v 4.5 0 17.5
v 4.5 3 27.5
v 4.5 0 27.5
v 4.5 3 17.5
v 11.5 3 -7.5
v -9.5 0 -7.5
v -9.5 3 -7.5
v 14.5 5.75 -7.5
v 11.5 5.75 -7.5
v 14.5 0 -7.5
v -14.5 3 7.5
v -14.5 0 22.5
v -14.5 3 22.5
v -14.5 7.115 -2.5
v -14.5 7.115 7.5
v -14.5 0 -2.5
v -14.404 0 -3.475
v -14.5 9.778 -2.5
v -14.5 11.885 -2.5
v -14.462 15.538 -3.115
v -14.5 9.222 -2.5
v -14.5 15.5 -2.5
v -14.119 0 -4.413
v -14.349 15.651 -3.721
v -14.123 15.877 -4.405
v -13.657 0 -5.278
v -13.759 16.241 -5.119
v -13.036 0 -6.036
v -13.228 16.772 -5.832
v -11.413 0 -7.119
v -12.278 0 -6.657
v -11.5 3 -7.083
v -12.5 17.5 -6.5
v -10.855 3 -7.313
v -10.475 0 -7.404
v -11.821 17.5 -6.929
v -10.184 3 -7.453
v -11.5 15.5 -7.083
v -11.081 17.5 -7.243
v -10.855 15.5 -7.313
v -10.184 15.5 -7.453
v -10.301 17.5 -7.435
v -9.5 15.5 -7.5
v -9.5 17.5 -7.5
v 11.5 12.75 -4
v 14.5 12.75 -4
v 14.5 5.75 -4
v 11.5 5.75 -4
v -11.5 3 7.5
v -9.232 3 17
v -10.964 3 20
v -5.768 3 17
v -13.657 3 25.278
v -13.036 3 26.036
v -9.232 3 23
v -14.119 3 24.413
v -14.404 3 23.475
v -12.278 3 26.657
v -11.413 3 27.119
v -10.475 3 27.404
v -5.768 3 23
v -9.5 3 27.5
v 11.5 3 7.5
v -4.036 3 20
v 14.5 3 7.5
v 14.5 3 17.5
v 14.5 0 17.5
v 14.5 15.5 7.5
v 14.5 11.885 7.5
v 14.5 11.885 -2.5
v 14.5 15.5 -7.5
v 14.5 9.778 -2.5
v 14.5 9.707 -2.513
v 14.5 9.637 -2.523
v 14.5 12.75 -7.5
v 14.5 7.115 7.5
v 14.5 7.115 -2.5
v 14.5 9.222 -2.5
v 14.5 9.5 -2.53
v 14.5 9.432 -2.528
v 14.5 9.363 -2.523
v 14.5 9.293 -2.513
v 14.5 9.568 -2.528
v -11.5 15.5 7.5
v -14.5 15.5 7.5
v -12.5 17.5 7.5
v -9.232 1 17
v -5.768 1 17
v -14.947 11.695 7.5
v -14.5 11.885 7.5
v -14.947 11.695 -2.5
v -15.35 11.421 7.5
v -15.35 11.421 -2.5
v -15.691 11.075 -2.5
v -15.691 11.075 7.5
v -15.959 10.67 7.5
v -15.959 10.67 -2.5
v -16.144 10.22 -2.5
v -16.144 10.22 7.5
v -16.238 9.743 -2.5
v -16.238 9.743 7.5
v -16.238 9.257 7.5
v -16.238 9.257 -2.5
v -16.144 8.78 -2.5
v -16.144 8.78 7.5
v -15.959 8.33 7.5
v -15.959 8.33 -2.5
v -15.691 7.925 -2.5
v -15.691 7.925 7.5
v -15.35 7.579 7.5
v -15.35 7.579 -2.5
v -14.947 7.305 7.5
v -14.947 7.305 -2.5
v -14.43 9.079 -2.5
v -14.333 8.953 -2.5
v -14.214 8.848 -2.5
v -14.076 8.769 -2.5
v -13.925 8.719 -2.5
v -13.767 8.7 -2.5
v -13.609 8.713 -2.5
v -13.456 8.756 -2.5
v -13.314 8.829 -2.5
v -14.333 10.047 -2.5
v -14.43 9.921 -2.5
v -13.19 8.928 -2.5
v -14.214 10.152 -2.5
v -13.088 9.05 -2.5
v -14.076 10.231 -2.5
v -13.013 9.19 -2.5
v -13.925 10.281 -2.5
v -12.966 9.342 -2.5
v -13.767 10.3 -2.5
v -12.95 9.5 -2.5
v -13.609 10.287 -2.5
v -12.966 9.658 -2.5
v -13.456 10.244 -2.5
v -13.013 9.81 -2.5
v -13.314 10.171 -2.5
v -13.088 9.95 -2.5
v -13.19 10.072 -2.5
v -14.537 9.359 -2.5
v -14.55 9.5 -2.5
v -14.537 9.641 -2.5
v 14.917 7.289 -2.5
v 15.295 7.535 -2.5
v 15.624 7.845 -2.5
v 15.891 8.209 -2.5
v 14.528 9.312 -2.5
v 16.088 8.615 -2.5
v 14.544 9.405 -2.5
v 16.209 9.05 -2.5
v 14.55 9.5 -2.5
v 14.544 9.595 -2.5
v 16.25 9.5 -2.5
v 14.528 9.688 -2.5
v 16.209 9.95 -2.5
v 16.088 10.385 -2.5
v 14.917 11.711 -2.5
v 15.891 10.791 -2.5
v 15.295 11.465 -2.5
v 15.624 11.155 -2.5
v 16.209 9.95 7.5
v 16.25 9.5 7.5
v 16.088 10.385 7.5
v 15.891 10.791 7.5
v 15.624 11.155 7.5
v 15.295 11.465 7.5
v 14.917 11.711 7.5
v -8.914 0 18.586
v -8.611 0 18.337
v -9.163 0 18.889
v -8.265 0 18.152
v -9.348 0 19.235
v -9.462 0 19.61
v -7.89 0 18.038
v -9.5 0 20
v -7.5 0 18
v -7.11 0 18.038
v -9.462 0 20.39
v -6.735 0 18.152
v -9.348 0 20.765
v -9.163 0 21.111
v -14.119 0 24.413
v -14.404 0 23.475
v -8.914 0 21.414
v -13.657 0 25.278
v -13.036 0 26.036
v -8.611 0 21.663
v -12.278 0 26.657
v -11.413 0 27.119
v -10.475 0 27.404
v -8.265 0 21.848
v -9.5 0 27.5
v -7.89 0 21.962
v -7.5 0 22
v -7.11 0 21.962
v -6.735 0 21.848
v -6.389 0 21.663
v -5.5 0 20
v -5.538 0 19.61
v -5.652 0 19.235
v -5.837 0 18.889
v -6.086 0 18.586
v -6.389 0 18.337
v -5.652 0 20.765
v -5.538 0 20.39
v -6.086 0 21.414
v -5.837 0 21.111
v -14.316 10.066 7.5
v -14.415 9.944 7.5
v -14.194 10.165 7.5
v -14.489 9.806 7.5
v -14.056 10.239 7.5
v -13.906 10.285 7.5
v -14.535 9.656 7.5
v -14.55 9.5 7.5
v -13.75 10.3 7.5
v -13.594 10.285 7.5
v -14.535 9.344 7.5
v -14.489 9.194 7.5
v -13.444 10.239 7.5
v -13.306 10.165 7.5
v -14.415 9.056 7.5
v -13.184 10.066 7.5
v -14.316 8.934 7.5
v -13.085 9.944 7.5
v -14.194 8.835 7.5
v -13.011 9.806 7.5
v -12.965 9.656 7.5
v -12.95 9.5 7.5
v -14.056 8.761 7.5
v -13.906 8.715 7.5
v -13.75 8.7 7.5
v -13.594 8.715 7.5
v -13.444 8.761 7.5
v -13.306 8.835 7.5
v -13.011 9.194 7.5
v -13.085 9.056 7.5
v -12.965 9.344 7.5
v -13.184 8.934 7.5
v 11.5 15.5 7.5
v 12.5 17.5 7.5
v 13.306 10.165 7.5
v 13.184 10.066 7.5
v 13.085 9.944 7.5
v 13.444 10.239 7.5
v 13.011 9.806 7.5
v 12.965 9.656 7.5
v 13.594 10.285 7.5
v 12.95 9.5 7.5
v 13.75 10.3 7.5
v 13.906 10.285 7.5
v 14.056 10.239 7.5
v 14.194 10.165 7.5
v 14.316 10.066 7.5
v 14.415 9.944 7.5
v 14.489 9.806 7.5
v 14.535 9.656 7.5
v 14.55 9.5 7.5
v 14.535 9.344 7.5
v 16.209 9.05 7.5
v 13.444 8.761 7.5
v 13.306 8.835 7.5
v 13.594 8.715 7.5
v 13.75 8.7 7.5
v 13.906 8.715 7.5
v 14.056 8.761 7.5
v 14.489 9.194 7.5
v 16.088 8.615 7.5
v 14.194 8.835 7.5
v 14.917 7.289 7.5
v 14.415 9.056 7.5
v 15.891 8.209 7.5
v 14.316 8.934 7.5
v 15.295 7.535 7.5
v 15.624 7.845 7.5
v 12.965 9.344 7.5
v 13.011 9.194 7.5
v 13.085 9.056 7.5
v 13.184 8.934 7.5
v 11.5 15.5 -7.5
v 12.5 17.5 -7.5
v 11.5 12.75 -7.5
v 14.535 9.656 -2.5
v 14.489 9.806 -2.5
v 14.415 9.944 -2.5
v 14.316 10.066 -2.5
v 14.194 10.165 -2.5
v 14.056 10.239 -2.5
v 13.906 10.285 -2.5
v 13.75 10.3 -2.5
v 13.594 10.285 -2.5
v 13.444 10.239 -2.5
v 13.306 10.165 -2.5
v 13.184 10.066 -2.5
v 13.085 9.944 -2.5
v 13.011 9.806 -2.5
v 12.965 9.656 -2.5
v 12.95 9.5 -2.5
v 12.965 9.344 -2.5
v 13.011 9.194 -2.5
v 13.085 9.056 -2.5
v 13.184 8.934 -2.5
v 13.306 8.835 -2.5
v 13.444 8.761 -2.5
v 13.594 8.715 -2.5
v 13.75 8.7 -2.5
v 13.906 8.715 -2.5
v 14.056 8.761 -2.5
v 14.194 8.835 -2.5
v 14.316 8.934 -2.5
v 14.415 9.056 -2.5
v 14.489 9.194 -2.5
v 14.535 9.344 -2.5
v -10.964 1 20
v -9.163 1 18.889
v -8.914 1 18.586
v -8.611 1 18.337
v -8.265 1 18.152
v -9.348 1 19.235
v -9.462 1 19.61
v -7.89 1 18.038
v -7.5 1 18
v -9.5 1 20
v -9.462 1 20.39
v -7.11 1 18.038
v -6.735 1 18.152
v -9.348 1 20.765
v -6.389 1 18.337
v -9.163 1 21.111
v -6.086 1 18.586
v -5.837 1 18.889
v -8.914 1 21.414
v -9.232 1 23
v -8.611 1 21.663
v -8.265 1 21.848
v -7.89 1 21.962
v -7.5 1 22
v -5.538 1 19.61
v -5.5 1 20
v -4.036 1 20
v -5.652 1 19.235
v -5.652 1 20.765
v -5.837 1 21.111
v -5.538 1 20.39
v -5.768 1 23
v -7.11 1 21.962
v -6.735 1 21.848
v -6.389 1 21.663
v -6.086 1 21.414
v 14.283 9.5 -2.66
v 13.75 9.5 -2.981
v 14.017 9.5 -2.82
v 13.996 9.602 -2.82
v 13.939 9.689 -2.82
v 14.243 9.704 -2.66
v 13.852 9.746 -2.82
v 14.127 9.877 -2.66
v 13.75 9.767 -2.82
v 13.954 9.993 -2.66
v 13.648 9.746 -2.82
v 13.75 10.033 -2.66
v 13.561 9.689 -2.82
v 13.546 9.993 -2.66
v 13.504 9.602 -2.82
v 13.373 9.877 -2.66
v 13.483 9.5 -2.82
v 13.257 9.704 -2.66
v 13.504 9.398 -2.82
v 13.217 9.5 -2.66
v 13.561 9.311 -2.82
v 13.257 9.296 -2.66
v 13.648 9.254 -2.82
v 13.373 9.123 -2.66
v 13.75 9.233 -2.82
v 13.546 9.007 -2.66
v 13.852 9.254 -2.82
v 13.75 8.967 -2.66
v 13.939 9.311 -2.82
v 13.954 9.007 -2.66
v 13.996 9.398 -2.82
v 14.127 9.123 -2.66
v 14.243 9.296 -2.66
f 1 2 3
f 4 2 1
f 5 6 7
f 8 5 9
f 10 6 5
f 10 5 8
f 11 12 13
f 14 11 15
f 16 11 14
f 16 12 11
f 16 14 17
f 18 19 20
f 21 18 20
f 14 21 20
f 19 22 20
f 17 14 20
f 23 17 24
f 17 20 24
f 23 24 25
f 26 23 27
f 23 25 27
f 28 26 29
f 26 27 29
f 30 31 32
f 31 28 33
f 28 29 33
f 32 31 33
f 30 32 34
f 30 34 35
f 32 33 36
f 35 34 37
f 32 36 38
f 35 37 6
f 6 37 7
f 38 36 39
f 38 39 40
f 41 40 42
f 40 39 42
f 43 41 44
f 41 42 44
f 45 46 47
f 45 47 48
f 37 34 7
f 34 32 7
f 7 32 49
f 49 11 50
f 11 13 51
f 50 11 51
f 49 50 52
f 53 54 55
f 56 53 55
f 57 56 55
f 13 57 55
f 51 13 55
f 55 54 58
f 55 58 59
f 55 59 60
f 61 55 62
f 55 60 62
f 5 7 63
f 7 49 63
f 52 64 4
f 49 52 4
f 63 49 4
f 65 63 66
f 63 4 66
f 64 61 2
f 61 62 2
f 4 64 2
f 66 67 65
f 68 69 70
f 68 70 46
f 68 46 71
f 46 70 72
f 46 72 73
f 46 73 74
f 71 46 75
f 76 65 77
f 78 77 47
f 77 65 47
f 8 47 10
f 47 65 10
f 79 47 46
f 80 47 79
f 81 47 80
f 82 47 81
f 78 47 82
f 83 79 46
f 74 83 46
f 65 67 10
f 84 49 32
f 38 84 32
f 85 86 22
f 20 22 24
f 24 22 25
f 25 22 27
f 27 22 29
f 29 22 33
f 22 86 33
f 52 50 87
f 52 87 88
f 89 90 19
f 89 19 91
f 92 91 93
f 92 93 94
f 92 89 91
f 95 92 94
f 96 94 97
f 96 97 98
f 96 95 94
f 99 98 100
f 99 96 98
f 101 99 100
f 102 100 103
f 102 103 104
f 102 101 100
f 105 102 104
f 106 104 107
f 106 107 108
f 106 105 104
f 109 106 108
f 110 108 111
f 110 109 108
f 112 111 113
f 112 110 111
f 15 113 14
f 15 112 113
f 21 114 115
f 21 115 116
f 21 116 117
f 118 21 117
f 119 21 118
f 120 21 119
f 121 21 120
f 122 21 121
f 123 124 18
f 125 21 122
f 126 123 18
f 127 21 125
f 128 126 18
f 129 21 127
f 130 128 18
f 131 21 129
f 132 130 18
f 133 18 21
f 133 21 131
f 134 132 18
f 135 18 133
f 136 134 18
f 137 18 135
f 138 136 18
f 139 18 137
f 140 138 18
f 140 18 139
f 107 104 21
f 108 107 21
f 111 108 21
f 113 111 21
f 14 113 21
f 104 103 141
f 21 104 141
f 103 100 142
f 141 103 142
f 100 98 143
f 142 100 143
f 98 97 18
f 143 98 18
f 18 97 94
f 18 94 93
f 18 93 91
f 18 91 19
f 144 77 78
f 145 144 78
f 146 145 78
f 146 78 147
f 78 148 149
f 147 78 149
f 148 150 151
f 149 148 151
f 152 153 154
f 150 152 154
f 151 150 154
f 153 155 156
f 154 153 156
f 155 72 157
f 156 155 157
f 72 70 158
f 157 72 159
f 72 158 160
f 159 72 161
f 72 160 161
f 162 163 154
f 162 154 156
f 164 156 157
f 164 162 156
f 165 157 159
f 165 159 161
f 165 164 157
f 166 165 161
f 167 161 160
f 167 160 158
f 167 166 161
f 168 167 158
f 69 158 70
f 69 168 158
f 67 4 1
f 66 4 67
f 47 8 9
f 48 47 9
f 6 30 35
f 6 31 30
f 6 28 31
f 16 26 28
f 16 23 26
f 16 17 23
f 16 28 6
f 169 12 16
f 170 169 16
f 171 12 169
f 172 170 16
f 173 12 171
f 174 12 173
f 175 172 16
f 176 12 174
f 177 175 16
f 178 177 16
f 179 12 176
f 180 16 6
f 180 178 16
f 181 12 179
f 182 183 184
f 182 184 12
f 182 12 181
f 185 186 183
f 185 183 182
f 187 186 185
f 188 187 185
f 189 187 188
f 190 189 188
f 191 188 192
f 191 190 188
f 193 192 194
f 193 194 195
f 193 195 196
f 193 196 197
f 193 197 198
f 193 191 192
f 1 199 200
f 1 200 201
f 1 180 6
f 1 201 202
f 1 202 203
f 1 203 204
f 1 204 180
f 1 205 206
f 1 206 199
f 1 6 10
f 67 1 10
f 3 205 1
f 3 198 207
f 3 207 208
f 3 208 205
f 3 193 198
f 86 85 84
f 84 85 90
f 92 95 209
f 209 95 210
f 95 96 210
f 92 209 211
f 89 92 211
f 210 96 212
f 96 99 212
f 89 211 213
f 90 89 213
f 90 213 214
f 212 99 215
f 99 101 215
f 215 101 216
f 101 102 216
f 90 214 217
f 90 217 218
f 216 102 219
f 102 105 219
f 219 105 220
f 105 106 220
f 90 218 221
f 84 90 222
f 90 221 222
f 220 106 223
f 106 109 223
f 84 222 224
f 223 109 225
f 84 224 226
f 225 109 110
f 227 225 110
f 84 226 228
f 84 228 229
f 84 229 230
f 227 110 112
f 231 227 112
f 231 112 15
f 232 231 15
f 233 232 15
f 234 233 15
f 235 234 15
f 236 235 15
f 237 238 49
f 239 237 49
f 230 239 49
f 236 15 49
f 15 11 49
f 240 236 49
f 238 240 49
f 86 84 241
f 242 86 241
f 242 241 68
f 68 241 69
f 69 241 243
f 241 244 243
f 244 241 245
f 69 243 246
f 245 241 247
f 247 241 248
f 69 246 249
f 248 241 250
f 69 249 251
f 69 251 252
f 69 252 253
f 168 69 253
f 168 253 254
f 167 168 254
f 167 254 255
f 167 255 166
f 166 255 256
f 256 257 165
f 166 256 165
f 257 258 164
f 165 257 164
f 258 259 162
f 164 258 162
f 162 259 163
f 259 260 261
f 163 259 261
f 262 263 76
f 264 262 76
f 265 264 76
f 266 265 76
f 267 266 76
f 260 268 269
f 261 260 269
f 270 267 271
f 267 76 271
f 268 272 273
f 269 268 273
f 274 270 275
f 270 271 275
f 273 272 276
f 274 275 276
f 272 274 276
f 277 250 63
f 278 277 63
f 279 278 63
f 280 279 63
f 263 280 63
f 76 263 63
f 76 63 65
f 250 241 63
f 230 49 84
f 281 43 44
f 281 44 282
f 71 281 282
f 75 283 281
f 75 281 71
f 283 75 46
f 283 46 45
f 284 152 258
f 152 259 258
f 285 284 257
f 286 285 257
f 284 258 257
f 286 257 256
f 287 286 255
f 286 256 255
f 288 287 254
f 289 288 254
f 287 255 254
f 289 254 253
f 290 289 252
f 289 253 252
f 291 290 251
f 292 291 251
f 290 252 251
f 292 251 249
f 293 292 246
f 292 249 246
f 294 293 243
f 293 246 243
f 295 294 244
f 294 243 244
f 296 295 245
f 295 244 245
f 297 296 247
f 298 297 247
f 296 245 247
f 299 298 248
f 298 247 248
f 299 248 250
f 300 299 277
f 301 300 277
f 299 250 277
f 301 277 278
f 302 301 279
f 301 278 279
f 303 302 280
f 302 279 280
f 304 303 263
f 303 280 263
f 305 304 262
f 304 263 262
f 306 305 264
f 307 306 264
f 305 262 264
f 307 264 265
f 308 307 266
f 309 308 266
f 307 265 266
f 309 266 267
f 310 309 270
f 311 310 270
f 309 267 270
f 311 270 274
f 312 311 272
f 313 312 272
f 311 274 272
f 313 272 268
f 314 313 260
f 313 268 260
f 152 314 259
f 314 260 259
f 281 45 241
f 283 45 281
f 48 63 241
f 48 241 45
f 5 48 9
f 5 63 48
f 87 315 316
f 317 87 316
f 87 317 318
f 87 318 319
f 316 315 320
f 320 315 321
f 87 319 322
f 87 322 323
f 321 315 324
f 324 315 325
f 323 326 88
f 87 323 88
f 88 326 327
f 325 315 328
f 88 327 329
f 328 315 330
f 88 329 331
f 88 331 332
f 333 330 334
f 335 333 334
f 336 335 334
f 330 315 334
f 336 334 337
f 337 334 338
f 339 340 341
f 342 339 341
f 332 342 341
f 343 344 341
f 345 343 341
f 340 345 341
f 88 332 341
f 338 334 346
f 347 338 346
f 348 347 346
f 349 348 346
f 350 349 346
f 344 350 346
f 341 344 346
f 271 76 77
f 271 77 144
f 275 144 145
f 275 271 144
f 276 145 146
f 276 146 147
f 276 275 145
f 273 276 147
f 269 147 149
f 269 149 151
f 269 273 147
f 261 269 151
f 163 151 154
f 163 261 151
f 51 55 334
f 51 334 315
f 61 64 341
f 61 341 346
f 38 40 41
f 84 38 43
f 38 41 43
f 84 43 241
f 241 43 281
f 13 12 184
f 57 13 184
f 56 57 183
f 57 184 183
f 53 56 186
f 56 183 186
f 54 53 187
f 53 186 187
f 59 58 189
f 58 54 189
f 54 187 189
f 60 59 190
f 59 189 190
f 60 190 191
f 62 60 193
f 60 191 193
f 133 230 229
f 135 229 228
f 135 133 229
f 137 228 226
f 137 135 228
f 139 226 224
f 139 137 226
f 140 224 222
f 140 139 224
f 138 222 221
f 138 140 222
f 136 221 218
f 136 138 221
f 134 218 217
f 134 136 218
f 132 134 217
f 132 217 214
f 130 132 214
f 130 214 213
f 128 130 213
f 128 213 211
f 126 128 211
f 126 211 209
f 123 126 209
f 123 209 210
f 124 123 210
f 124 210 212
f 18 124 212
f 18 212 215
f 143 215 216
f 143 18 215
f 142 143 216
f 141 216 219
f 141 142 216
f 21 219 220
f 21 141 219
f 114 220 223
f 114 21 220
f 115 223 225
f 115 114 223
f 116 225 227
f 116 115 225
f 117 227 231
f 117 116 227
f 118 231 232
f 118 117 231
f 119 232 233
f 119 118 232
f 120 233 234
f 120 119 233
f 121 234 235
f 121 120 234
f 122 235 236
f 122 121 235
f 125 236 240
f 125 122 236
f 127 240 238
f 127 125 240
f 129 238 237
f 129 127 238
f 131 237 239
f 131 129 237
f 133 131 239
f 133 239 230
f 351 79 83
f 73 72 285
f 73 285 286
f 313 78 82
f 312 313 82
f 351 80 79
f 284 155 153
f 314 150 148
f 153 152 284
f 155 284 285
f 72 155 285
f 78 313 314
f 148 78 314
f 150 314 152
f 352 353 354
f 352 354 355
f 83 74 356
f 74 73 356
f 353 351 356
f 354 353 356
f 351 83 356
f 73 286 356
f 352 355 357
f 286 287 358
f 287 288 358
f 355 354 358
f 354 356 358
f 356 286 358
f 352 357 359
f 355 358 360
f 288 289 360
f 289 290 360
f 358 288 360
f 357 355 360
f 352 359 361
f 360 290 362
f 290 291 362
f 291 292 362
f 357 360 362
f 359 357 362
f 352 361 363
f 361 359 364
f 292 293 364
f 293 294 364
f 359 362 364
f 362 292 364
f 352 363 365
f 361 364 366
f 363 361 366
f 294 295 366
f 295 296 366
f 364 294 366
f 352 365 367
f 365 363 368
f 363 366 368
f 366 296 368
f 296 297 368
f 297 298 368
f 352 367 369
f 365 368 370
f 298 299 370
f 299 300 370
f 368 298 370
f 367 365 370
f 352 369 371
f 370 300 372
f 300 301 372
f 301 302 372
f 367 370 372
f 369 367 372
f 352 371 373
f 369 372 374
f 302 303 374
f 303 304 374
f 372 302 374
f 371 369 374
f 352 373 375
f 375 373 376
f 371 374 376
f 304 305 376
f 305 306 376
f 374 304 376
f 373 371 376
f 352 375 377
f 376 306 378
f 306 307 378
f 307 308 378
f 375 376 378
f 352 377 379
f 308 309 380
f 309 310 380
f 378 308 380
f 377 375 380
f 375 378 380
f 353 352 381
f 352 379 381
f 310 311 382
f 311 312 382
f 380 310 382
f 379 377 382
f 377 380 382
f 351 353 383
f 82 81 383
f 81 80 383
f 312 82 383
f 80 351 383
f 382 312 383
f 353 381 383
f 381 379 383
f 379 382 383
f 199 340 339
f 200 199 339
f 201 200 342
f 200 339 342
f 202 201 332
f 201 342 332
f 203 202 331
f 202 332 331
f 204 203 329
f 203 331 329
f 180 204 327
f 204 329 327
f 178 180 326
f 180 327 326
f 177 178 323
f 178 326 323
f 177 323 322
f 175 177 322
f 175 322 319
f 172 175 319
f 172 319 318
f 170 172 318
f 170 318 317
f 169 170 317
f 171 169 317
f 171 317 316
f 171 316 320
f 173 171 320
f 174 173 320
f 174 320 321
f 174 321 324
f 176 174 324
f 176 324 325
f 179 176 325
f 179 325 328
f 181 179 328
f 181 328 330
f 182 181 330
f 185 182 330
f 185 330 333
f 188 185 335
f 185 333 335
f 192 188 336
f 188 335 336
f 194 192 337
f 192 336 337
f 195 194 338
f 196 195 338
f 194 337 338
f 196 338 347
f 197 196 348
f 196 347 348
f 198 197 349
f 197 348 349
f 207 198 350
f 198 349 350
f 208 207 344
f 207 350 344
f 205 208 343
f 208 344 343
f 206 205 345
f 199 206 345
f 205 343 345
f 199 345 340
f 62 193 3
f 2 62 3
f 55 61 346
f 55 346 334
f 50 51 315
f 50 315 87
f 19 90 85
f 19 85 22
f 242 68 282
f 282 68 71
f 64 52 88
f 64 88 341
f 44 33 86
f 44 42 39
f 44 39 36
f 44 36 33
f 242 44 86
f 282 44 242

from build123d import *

# Parameters (mm, degrees)
SKETCH1_W                           = 23
SKETCH1_H                           = 15
BOSS_EXTRUDE1_DEPTH                 = 3
BOSS_EXTRUDE2_DEPTH                 = 12.5
BOSS_EXTRUDE2_DEPTH_BACK            = 3
SKETCH2_W                           = 3
SKETCH2_H                           = 15
BOSS_EXTRUDE3_DEPTH                 = 10
TAP_START                           = -2.5
TAP_DRILL_FOR_M2X0_4_TAP1_OUTLINE_R = 0.8
TAP_DRILL_FOR_M2X0_4_TAP1_DEPTH     = 10
SKETCH6_W                           = 29
SKETCH6_H                           = 20
BOSS_EXTRUDE4_DEPTH                 = 3
SKETCH7_W                           = 10
SKETCH7_H                           = 10
CUT_EXTRUDE1_DEPTH                  = 35.301056835
CUT_EXTRUDE2_DEPTH                  = 2
F_4_0_4_DIAMETER_HOLE1_D            = 4
F_4_0_4_DIAMETER_HOLE1_DEPTH        = 10
F_4_0_4_DIAMETER_HOLE1_TIP          = 1.201721238
SKETCH12_W                          = 29
SKETCH12_H                          = 15
BOSS_EXTRUDE5_DEPTH                 = 2
SKETCH13_W                          = 3
SKETCH13_H                          = 7
CUT_EXTRUDE4_DEPTH                  = 3.5
CHAMFER1_SIZE                       = 2
FILLET1_R                           = 5


# Read off the part's stored shape, not the designer's step: Tap Drill for M2x0.4 Tap1
with BuildPart() as part:
    # Sketch1 → Boss-Extrude1 (new body)
    with BuildSketch(Plane(origin=(0, 0, 0), x_dir=(1, 0, 0), z_dir=(0, 1, 0))):
        Rectangle(SKETCH1_W, SKETCH1_H)
    extrude(amount=BOSS_EXTRUDE1_DEPTH)

    # Sketch2 → Boss-Extrude2 (add, two sides: drawn at the far end of the back side and taken through both)
    with BuildSketch(Plane(origin=(0, 3, 0), x_dir=(1, 0, 0), z_dir=(0, 1, 0)).offset(-BOSS_EXTRUDE2_DEPTH_BACK)):
        with Locations((13, 0)):
            Rectangle(SKETCH2_W, SKETCH2_H)
        with Locations((-13, 0)):
            Rectangle(SKETCH2_W, SKETCH2_H)
    extrude(amount=BOSS_EXTRUDE2_DEPTH + BOSS_EXTRUDE2_DEPTH_BACK)

    # Sketch3 → Boss-Extrude3 (add)
    with BuildSketch(Plane.XY.offset(7.5)):
        with BuildLine():
            ThreePointArc((16.25, 9.5), (15.765564437, 10.979019946), (14.5, 11.884848004))
            Line((14.5, 11.884848004), (14.5, 7.115151996))
            ThreePointArc((14.5, 7.115151996), (15.765564437, 8.020980054), (16.25, 9.5))
        make_face()
        with BuildLine():
            Line((-14.5, 7.115151996), (-14.5, 11.884848004))
            ThreePointArc((-14.5, 11.884848004), (-16.25, 9.5), (-14.5, 7.115151996))
        make_face()
    extrude(amount=-BOSS_EXTRUDE3_DEPTH)

    # Tap Drill for M2x0.4 Tap1 outline → Tap Drill for M2x0.4 Tap1 (cut)
    with BuildSketch(Plane.XY.offset(TAP_START)):
        with Locations((-13.75, 9.5)):
            Circle(TAP_DRILL_FOR_M2X0_4_TAP1_OUTLINE_R)
    extrude(amount=TAP_DRILL_FOR_M2X0_4_TAP1_DEPTH, mode=Mode.SUBTRACT)

    # Tap Drill for M2x0.4 Tap1 2 outline → Tap Drill for M2x0.4 Tap1 2 (revolve, cut)
    with BuildSketch(Plane(origin=(13.75, 9.5, 0), x_dir=(1, 0, 0), z_dir=(0, -1, 0))):
        Polygon((0, 7.5), (0, -2.980688495), (0.800001695, -2.499998981), (0.8, 7.5), align=None)
    revolve(axis=Axis((13.75, 9.5, 0), (0, 0, 1)), mode=Mode.SUBTRACT)

    # Sketch6 → Boss-Extrude4 (add)
    with BuildSketch(Plane.XZ):
        with Locations((0, 17.5)):
            Rectangle(SKETCH6_W, SKETCH6_H)
    extrude(amount=-BOSS_EXTRUDE4_DEPTH)

    # Sketch7 → Cut-Extrude1 (cut, through all)
    with BuildSketch(Plane(origin=(0, 3, 0), x_dir=(1, 0, 0), z_dir=(0, 1, 0))):
        with Locations((9.5, -22.5)):
            Rectangle(SKETCH7_W, SKETCH7_H)
    extrude(amount=-CUT_EXTRUDE1_DEPTH, mode=Mode.SUBTRACT)

    # Sketch8 → Cut-Extrude2 (cut)
    with BuildSketch(Plane.XZ.offset(-3)):
        Polygon((-5.767949192, 17), (-4.035898385, 20), (-5.767949192, 23), (-9.232050808, 23), (-10.964101615, 20), (-9.232050808, 17), align=None)
    extrude(amount=CUT_EXTRUDE2_DEPTH, mode=Mode.SUBTRACT)

    # Ø4.0 (4) Diameter Hole1
    with Locations(Plane(origin=(0, 0, 0), x_dir=(-1, 0, 0), z_dir=(0, -1, 0))):
        with Locations((7.5, -20)):
            Hole(F_4_0_4_DIAMETER_HOLE1_D / 2, depth=F_4_0_4_DIAMETER_HOLE1_DEPTH)
            with Locations((0, 0, -(F_4_0_4_DIAMETER_HOLE1_DEPTH + F_4_0_4_DIAMETER_HOLE1_TIP / 2))):  # 118° drill point
                Cone(0, F_4_0_4_DIAMETER_HOLE1_D / 2, F_4_0_4_DIAMETER_HOLE1_TIP, mode=Mode.SUBTRACT)

    # Sketch12 → Boss-Extrude5 (add)
    with BuildSketch(Plane(origin=(0, 15.5, 0), x_dir=(1, 0, 0), z_dir=(0, 1, 0))):
        Rectangle(SKETCH12_W, SKETCH12_H)
    extrude(amount=BOSS_EXTRUDE5_DEPTH)

    # Sketch13 → Cut-Extrude4 (cut)
    with BuildSketch(Plane(origin=(0, 0, -7.5), x_dir=(-1, 0, 0), z_dir=(0, 0, -1))):
        with Locations((-13, 9.25)):
            Rectangle(SKETCH13_W, SKETCH13_H)
    extrude(amount=-CUT_EXTRUDE4_DEPTH, mode=Mode.SUBTRACT)

    # Chamfer1
    chamfer1_edges = [part.edges().sort_by_distance(p)[0] for p in [
        (-14.5, 17.5, 0),
        (14.5, 17.5, 0),
    ]]
    chamfer(chamfer1_edges, length=CHAMFER1_SIZE)

    # Fillet1
    # the kernel refuses this fillet: 5 mm, written as the material it takes off along each edge
    with BuildSketch(Plane(origin=(-14.5, -12.5, 27.5), x_dir=(0, 0, -1), z_dir=(0, 1, 0))) as fillet1_piece_1:
        with BuildLine():
            CenterArc((FILLET1_R, -FILLET1_R), FILLET1_R, 90, 90)
            Line((0, -FILLET1_R), (0, 0))
            Line((0, 0), (FILLET1_R, 0))
        make_face()
    extrude(amount=28, mode=Mode.SUBTRACT)
    with BuildSketch(Plane(origin=(-14.5, 28, -7.5), x_dir=(0, 0, 1), z_dir=(0, -1, 0))) as fillet1_piece_2:
        with BuildLine():
            CenterArc((FILLET1_R, -FILLET1_R), FILLET1_R, 90, 90)
            Line((0, -FILLET1_R), (0, 0))
            Line((0, 0), (FILLET1_R, 0))
        make_face()
    extrude(amount=40.5, mode=Mode.SUBTRACT)


solid = part.part
